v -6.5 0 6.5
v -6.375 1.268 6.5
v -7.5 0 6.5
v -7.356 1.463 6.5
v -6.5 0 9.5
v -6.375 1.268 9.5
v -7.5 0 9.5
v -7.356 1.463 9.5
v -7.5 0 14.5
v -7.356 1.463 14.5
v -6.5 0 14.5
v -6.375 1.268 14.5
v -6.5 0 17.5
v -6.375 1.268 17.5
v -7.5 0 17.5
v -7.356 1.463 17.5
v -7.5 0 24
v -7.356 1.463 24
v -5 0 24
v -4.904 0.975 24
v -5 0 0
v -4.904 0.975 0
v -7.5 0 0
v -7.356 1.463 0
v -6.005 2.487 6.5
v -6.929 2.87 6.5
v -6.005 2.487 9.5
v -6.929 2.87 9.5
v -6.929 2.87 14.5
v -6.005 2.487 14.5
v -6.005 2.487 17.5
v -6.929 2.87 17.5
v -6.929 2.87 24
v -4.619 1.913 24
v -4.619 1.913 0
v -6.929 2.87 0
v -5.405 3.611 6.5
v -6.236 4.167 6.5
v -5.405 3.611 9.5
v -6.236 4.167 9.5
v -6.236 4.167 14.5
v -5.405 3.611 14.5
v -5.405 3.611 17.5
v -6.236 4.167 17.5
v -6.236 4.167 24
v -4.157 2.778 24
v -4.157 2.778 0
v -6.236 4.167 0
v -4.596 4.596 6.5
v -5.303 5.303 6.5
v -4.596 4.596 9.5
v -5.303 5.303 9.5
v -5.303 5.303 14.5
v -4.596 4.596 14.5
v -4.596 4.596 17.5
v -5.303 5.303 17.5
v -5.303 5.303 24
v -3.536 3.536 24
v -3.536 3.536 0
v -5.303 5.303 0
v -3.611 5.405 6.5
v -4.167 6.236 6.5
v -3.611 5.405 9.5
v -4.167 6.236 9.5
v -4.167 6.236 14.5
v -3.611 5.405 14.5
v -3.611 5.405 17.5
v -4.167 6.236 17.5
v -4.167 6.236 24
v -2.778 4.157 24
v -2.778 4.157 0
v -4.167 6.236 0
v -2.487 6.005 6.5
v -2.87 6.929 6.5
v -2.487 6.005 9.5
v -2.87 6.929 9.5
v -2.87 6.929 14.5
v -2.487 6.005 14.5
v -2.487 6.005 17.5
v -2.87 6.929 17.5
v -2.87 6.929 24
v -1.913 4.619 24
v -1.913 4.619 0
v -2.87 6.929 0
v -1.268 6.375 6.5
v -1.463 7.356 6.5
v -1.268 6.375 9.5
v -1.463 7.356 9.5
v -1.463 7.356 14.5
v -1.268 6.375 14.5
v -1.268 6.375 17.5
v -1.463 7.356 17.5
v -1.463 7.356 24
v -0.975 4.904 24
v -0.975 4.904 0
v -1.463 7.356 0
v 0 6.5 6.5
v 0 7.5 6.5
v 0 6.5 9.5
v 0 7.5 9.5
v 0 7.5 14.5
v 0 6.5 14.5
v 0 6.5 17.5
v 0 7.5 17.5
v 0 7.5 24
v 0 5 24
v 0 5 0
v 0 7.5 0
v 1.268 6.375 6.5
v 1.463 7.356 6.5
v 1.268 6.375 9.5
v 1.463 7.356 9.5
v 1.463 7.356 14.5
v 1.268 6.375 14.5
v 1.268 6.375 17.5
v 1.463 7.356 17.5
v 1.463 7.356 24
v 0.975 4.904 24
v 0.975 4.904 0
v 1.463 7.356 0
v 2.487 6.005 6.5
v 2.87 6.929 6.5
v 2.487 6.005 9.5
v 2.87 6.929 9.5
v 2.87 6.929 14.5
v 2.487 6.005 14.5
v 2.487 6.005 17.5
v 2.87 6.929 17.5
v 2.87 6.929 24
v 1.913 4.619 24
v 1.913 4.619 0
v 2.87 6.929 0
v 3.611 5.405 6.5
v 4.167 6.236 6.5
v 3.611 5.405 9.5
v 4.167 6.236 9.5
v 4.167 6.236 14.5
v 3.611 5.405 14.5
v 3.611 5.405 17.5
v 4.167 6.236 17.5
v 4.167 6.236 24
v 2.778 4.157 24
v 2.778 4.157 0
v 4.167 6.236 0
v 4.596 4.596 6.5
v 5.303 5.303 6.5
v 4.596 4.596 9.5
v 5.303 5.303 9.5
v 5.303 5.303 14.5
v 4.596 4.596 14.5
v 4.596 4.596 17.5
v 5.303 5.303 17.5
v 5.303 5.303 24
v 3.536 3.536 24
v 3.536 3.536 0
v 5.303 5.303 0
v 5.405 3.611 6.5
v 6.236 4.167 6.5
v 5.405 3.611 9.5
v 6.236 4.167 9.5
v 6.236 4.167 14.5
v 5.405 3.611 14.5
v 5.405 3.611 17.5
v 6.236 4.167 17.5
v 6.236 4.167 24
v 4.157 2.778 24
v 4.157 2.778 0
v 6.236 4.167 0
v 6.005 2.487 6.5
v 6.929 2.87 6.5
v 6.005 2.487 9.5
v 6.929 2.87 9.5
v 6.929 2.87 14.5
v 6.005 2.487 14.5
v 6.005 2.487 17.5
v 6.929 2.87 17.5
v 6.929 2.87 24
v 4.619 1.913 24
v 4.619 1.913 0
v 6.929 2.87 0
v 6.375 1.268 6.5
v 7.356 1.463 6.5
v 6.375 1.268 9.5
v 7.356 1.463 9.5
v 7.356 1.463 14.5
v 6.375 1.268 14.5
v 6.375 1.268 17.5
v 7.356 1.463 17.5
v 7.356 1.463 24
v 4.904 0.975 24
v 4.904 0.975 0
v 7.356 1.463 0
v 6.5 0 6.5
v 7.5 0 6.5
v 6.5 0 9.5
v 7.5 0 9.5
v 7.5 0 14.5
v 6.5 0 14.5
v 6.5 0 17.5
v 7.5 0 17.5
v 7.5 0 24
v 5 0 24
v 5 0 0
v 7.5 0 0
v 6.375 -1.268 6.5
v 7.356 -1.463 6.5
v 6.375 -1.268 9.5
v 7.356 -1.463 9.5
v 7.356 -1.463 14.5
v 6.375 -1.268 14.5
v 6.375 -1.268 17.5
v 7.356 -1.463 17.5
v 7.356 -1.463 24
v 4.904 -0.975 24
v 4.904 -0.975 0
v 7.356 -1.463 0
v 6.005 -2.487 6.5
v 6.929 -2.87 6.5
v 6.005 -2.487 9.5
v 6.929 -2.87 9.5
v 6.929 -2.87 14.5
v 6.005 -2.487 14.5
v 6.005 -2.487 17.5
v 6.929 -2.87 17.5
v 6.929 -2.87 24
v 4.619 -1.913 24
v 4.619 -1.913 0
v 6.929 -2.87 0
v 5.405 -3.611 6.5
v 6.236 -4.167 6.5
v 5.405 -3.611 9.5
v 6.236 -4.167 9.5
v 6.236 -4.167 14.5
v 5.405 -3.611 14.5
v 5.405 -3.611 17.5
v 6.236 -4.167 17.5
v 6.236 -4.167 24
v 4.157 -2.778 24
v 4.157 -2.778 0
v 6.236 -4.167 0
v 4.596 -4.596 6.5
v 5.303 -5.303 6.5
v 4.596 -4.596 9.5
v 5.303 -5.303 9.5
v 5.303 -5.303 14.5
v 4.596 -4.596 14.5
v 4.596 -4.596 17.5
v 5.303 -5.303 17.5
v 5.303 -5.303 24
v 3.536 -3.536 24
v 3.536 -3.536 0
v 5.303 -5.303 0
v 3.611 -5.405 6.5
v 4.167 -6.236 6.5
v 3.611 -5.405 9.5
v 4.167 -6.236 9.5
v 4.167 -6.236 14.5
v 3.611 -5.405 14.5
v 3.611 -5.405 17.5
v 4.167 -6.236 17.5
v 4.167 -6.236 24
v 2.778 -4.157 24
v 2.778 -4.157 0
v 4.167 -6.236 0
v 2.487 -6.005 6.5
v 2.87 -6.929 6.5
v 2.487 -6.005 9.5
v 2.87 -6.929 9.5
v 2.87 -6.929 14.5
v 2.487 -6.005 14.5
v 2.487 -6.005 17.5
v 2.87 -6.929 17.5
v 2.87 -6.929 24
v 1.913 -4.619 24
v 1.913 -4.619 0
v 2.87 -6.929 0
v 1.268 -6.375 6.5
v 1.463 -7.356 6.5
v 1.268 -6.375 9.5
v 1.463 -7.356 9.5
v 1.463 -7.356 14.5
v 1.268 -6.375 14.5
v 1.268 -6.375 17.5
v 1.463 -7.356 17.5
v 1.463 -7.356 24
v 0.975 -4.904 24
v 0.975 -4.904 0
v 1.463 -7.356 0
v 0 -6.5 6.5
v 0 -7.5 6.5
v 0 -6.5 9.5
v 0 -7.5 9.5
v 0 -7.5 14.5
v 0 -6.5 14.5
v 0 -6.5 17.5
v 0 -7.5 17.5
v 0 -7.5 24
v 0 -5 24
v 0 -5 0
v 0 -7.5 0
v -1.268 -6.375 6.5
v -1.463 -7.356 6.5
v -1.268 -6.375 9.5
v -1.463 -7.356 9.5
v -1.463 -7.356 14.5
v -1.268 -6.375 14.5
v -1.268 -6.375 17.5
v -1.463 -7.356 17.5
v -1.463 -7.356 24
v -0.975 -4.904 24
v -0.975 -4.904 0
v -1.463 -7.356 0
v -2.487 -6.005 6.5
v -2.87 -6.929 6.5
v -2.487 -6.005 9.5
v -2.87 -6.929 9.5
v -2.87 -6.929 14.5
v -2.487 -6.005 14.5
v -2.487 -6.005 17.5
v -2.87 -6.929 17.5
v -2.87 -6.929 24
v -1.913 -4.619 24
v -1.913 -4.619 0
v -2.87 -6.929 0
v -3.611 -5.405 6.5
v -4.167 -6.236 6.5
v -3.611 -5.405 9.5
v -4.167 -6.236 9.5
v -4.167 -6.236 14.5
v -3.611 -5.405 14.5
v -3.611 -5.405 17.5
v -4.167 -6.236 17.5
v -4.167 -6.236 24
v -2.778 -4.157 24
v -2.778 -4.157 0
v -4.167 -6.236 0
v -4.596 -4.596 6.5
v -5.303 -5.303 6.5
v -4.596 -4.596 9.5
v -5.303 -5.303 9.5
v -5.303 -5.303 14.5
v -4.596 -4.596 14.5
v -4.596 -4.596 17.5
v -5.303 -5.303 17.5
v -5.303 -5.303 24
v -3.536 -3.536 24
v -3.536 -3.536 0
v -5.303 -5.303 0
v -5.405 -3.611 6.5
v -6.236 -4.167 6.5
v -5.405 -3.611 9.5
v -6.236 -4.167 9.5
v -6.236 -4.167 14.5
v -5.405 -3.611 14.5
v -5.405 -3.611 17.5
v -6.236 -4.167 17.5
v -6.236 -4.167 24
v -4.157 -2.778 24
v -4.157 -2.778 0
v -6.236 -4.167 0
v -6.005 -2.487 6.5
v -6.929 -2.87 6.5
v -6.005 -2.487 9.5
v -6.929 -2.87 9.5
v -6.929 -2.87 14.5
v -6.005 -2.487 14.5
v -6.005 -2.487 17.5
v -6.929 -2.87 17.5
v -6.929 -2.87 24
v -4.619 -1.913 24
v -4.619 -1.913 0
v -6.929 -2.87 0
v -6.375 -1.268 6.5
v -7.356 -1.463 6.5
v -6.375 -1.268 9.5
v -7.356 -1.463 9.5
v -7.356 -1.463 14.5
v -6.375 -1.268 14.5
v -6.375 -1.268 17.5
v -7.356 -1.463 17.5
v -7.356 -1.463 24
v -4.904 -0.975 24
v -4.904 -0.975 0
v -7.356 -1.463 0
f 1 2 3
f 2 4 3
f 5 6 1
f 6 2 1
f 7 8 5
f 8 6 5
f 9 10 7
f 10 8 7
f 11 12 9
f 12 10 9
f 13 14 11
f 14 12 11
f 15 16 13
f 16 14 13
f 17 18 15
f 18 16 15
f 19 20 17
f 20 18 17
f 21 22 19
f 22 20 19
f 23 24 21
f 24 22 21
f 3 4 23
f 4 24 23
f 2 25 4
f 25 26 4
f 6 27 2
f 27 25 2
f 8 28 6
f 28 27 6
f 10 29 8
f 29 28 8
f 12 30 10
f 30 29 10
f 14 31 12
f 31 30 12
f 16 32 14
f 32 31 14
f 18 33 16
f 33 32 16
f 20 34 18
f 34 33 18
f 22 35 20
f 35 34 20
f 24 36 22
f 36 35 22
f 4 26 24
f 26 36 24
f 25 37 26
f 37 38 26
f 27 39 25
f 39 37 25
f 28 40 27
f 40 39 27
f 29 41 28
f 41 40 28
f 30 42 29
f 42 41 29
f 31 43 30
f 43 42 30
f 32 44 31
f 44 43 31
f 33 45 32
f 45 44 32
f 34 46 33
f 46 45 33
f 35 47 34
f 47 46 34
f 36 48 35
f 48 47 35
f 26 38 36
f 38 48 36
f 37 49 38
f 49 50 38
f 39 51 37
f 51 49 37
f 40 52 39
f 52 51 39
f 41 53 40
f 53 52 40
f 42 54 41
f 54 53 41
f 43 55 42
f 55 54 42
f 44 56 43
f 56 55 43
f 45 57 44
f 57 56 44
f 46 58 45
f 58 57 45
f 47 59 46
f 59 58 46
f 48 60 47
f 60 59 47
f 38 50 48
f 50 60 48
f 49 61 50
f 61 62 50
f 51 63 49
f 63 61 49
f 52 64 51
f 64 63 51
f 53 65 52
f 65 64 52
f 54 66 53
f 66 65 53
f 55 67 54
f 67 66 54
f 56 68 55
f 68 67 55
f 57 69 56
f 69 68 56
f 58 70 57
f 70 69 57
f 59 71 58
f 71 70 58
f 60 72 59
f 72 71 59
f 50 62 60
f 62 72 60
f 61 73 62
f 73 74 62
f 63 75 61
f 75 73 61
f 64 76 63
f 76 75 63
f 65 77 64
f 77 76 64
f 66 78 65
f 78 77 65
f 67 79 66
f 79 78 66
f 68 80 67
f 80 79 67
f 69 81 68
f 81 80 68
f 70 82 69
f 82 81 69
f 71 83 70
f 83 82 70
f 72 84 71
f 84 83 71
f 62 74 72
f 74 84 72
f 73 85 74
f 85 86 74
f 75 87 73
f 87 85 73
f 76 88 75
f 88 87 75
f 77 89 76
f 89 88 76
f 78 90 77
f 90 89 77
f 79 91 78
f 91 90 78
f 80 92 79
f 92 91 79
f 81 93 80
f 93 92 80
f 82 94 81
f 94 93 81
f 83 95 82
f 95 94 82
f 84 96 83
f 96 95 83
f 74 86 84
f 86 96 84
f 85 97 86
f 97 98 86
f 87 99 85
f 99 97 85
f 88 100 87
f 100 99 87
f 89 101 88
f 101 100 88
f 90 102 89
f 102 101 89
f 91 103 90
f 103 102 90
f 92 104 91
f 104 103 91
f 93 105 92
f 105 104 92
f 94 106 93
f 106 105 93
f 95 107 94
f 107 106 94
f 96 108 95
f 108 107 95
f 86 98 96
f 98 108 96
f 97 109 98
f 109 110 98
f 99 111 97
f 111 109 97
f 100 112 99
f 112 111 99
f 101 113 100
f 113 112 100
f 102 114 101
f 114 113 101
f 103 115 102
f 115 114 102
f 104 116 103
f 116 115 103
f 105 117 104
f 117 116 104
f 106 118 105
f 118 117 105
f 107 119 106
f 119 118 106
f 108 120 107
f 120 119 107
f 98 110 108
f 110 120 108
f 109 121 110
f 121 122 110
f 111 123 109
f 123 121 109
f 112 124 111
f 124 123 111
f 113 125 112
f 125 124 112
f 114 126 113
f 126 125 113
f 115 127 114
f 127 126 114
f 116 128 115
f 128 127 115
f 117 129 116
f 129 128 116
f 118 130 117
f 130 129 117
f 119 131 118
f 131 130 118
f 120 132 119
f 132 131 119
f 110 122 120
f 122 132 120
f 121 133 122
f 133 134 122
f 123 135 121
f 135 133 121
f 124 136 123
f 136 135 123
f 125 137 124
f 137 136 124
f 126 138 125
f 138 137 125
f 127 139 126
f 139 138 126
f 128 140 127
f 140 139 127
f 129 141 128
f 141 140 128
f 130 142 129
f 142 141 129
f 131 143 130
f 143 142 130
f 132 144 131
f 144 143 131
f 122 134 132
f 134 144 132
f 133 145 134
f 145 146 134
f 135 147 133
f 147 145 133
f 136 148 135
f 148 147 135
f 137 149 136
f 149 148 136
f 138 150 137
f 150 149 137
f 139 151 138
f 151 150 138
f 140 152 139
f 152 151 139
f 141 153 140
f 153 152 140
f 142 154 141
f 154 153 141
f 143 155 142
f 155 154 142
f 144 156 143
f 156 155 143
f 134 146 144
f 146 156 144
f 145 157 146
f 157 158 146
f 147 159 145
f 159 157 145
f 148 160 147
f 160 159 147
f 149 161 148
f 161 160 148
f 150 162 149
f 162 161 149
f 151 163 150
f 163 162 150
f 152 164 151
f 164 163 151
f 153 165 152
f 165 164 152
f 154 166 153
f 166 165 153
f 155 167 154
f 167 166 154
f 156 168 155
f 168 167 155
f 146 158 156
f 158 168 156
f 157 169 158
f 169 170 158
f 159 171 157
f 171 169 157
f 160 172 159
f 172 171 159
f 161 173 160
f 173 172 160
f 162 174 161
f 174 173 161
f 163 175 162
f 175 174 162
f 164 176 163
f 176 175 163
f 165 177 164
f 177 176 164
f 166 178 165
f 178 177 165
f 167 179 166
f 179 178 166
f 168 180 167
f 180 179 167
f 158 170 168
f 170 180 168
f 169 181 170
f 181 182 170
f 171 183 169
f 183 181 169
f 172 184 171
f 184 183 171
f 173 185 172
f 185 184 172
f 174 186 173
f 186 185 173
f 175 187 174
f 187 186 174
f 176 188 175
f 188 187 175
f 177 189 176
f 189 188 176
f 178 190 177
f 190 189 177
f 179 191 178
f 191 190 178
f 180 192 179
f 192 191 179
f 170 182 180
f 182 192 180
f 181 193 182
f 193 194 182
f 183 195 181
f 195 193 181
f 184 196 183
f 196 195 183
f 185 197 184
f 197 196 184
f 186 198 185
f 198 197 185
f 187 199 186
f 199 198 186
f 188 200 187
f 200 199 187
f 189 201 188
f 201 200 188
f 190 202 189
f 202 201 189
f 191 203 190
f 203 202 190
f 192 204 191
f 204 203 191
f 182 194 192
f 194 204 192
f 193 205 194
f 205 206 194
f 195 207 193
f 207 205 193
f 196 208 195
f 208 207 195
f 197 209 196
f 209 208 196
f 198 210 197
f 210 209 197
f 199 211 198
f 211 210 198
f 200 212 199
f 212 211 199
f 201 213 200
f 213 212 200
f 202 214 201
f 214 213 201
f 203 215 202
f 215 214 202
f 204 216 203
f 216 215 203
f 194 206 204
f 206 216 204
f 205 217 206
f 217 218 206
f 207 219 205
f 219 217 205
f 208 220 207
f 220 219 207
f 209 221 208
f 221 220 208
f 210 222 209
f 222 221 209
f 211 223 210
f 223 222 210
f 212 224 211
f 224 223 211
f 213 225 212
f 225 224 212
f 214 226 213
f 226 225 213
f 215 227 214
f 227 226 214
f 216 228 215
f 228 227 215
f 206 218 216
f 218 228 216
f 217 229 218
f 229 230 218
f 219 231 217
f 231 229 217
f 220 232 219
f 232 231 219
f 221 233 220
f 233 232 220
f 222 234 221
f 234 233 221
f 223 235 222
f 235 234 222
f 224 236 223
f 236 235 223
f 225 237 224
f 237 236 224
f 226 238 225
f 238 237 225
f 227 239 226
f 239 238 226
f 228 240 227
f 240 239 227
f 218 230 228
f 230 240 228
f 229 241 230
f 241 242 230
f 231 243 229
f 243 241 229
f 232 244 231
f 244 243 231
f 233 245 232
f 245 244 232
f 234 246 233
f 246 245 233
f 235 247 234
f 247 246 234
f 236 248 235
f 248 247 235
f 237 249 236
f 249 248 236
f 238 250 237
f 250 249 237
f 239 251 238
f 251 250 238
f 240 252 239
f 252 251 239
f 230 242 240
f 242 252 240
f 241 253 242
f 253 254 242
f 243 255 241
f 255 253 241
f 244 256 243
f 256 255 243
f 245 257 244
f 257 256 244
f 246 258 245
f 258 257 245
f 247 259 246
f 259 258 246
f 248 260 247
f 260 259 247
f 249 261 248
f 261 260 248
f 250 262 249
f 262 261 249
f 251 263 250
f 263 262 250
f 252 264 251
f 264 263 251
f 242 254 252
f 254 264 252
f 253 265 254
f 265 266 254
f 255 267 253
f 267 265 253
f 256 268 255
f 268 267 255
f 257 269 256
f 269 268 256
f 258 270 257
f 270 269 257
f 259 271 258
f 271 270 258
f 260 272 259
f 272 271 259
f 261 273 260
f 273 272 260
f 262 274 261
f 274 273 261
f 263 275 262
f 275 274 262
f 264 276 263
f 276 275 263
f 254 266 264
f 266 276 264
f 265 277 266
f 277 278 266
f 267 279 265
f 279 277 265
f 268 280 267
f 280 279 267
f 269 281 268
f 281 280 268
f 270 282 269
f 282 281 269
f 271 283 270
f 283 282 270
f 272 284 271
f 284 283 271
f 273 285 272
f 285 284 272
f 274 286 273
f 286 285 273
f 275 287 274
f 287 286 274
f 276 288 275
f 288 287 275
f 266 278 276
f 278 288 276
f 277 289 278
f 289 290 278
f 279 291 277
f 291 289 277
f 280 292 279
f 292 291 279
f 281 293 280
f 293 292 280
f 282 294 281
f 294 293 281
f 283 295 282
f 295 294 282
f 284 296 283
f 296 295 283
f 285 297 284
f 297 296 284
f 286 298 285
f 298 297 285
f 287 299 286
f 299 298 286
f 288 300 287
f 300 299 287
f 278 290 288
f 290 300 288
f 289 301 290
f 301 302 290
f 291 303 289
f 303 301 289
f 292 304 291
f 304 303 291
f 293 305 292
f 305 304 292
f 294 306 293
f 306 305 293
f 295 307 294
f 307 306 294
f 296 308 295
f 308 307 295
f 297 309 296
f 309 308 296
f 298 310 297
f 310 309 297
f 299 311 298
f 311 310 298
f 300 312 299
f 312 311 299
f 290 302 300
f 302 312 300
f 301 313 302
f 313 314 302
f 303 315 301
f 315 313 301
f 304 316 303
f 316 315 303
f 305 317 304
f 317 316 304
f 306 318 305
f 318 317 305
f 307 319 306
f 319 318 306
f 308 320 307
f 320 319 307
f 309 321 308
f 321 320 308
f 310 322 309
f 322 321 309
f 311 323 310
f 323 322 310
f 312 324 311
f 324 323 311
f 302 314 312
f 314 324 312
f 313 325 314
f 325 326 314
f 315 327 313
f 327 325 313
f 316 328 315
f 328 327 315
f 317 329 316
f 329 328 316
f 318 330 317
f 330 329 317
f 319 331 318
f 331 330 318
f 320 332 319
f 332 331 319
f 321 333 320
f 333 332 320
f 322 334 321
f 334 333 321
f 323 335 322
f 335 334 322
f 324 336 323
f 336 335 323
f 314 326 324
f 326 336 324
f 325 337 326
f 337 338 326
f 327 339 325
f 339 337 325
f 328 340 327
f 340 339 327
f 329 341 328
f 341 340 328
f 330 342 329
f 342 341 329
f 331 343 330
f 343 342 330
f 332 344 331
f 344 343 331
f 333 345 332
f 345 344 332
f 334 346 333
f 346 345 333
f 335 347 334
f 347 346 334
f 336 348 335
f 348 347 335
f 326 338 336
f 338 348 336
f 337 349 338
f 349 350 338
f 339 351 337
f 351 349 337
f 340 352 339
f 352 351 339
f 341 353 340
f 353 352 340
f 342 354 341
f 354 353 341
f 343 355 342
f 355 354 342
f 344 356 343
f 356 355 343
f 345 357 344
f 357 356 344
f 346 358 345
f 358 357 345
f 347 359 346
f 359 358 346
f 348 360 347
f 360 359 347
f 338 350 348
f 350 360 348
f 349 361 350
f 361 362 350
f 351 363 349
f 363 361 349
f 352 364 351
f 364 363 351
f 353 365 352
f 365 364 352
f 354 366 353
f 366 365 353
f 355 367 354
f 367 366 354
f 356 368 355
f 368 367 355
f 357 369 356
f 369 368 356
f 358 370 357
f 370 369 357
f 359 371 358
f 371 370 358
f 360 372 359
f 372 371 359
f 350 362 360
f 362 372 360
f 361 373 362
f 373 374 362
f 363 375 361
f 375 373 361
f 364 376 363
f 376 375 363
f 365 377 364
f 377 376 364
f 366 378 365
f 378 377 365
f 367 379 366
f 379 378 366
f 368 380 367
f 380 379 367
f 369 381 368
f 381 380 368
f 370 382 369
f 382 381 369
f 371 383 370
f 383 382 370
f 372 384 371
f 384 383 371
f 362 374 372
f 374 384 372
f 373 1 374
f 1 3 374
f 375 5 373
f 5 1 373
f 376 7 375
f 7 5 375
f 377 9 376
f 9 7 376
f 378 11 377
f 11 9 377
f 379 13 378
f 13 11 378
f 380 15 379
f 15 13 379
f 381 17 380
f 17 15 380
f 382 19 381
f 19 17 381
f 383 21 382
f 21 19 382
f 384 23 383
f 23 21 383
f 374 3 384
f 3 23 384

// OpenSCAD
$fn = 32;

// ----------------------------------------------------------------------
// Grooved revolve: plain_grooves, bore R5
// ----------------------------------------------------------------------

// --- parameters (mm) ---
bore_r = 5;               // bore radius
outer_r = 7.5;            // outer radius of the body
total_h = 24;             // overall height, Z
wall = 2.5;               // radial wall thickness
groove_w = 3;             // groove width
groove_d = 1;             // groove depth
grooves = 2;              // number of outer grooves
fit_tol = 0.1;            // declared fit tolerance (prompt contract)
free_tol = 0.3;           // declared free tolerance (prompt contract)

bbox_x = 2 * outer_r;  // full diameter
bore_d = 2 * bore_r;  // bore diameter
body_d = 2 * outer_r;  // body diameter
revolve_angle = 360;  // full turn around the Z axis

profile = [[5, 0], [7.5, 0], [7.5, 6.5], [6.5, 6.5], [6.5, 9.5], [7.5, 9.5], [7.5, 14.5], [6.5, 14.5], [6.5, 17.5], [7.5, 17.5], [7.5, 24], [5, 24]];  // primary outline, 12 points, counter clockwise

// --- the one profile operation ---
rotate_extrude(angle = revolve_angle) polygon(points = profile);
